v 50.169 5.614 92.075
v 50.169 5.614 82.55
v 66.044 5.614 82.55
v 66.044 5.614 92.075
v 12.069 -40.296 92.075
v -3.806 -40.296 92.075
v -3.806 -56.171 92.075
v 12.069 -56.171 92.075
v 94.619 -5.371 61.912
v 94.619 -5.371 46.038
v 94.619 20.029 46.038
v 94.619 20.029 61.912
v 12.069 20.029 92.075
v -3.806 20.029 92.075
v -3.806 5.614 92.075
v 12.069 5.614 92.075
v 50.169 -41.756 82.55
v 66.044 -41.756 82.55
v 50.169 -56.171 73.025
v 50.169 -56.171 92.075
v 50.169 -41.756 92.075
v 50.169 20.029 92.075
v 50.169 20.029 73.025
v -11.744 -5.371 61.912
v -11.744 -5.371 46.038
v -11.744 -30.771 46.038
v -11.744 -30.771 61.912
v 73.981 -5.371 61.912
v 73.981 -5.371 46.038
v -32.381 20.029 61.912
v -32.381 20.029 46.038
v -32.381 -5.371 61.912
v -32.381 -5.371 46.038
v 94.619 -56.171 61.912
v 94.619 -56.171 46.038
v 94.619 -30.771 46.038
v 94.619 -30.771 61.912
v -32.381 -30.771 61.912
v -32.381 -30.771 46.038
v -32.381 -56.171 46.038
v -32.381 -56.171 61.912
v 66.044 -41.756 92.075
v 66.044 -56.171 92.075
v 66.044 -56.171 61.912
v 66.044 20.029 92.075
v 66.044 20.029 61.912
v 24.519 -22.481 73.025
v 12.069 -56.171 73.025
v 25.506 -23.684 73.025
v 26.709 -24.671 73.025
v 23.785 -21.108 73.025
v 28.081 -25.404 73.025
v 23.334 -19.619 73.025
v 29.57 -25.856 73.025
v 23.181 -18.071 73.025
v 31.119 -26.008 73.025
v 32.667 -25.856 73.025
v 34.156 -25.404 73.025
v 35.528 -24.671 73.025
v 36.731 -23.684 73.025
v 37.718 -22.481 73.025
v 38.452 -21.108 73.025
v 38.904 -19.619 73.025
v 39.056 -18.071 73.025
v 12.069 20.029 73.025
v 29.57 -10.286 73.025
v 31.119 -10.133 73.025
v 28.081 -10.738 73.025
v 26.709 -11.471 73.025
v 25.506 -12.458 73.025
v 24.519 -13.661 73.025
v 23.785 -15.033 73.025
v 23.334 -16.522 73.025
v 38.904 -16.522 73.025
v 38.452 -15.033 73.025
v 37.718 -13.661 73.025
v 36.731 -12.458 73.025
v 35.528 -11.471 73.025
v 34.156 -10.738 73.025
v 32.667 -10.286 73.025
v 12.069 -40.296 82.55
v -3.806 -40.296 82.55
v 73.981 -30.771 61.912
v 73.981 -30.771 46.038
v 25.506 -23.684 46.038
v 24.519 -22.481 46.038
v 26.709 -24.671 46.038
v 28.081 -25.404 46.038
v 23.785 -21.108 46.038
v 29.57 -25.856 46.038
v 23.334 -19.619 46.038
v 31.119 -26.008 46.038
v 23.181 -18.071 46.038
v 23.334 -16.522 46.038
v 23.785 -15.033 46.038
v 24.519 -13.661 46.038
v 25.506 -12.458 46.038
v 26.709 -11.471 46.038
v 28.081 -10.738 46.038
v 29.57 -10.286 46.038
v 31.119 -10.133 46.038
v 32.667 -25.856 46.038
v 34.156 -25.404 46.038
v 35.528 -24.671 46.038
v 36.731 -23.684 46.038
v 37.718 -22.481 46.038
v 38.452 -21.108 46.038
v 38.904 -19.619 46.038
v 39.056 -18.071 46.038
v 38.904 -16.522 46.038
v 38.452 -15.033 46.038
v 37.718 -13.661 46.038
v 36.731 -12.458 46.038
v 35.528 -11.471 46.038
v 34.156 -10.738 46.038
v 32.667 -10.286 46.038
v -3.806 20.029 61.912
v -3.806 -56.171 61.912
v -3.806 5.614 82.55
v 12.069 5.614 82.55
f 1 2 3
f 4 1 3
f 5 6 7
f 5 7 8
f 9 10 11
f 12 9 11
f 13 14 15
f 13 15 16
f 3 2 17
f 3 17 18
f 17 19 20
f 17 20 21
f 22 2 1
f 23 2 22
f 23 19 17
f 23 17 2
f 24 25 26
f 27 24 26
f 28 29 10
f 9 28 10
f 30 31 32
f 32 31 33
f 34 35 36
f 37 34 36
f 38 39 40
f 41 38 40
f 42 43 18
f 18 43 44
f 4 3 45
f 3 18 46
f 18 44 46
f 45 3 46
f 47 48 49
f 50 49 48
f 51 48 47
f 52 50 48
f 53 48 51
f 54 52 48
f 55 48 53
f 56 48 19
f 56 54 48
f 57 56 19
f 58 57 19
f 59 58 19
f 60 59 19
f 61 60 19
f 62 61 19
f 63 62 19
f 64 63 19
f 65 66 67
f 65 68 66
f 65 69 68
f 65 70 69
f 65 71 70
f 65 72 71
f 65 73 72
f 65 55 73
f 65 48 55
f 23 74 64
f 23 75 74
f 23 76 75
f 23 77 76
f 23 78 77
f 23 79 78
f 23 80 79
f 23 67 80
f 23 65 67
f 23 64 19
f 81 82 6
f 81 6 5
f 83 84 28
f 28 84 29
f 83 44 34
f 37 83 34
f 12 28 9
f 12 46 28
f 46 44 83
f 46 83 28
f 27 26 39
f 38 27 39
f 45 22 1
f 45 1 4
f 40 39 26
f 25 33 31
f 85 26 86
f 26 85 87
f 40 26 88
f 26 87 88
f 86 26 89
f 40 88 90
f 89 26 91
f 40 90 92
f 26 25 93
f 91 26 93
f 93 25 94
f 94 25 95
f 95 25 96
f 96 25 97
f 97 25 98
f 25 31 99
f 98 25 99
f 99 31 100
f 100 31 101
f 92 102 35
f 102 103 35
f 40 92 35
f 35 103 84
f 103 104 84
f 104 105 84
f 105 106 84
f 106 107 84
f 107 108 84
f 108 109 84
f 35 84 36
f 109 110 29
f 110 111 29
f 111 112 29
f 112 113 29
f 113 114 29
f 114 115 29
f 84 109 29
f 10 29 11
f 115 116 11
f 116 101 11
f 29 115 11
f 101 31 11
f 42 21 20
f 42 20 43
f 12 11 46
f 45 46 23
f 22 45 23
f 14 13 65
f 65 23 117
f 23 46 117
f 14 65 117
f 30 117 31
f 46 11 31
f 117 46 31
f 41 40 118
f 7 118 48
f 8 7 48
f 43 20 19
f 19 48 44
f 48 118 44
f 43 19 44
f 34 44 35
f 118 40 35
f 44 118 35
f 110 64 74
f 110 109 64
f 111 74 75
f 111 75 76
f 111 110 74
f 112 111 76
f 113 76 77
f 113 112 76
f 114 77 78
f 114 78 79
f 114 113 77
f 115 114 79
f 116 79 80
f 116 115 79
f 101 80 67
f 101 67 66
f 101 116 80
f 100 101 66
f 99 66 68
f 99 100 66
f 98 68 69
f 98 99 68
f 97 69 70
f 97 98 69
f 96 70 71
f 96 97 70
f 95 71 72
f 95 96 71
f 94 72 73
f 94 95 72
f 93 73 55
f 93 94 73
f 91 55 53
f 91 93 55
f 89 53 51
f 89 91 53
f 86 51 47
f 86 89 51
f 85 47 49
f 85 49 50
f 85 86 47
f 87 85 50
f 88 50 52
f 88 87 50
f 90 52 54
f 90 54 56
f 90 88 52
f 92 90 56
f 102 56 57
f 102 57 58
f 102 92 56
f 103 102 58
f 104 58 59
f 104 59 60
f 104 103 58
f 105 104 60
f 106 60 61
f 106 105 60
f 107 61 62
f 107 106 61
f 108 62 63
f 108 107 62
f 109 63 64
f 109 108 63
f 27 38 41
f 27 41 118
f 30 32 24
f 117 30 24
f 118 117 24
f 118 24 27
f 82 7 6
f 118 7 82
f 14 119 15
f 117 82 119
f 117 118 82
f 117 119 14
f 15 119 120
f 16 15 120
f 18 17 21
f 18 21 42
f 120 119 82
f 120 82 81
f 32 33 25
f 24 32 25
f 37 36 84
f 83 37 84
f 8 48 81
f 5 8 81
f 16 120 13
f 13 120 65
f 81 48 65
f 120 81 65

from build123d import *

# Parameters (mm, degrees)
F0_W     = 31.75
F0_H     = 31.75
F0_R     = 15.875
F0_H_2   = 28.8293883204
F1_DEPTH = 31.75
F0_H_3   = 91.8206116796
F0_H_4   = 94.7412233591
F2_DEPTH = 73.025
F3_DEPTH = 92.075
F4_DEPTH = 22.225
F5_SCALE = 0.5


with BuildPart() as f1:
    # F0 (on Top) → F1 (new body)
    with BuildSketch(Plane.XY):
        Polygon((-114.9314489663, -5.3708956957), (-114.9314489663, -56.1708956957), (-57.7814489663, -56.1708956957), (-57.7814489663, -24.4208956957), (-57.7814489663, 67.3997159839), (-57.7814489663, 96.2291043043), (-114.9314489663, 96.2291043043), (-114.9314489663, 45.4291043043), (-73.6564489663, 45.4291043043), (-73.6564489663, -5.3708956957), align=None)
        with Locations((-41.9064489663, -40.2958956957)):
            Rectangle(F0_W, F0_H)
        Polygon((-26.0314489663, -24.4208956957), (-26.0314489663, -56.1708956957), (50.1685510337, -56.1708956957), (50.1685510337, -27.3415073752), (50.1685510337, 67.3997159839), (50.1685510337, 96.2291043043), (-26.0314489663, 96.2291043043), (-26.0314489663, 67.3997159839), align=None)
        with Locations((12.0685510337, 20.0291043043)):
            Circle(F0_R, mode=Mode.SUBTRACT)
        with Locations((66.0435510337, -41.7562015355)):
            Rectangle(F0_W, F0_H_2)
        with Locations((-41.9064489663, 81.8144101441)):
            Rectangle(F0_W, F0_H_2)
        Polygon((81.9185510337, -27.3415073752), (81.9185510337, -56.1708956957), (139.0685510337, -56.1708956957), (139.0685510337, -5.3708956957), (97.7935510337, -5.3708956957), (97.7935510337, 45.4291043043), (139.0685510337, 45.4291043043), (139.0685510337, 96.2291043043), (81.9185510337, 96.2291043043), (81.9185510337, 67.3997159839), align=None)
        with Locations((66.0435510337, 81.8144101441)):
            Rectangle(F0_W, F0_H_2)
    extrude(amount=F1_DEPTH)

    # F0 (on Top) → F2 (join)
    with BuildSketch(Plane.XY):
        with Locations((-41.9064489663, 21.4894101441)):
            Rectangle(F0_W, F0_H_3)
        with Locations((66.0435510337, 20.0291043043)):
            Rectangle(F0_W, F0_H_4)
    extrude(amount=F2_DEPTH)

    # F0 (on Top) → F3 (join)
    with BuildSketch(Plane.XY):
        with Locations((-41.9064489663, 81.8144101441)):
            Rectangle(F0_W, F0_H_2)
        with Locations((-41.9064489663, -40.2958956957)):
            Rectangle(F0_W, F0_H)
        with Locations((66.0435510337, -41.7562015355)):
            Rectangle(F0_W, F0_H_2)
        with Locations((66.0435510337, 81.8144101441)):
            Rectangle(F0_W, F0_H_2)
    extrude(amount=F3_DEPTH)

    # F4 (add): a face of the model
    f4_faces = [f1.faces().sort_by_distance(p)[0] for p in [
        (-24.3275651674, 20.0291043043, 31.75),
    ]]
    extrude(f4_faces, amount=F4_DEPTH)


with BuildPart() as f1_1:
    # F5: moved
    add(f1.part.scale(F5_SCALE).moved(Location((25.0842755169, -28.0854478478, 46.0375))))


solid = f1_1.part
